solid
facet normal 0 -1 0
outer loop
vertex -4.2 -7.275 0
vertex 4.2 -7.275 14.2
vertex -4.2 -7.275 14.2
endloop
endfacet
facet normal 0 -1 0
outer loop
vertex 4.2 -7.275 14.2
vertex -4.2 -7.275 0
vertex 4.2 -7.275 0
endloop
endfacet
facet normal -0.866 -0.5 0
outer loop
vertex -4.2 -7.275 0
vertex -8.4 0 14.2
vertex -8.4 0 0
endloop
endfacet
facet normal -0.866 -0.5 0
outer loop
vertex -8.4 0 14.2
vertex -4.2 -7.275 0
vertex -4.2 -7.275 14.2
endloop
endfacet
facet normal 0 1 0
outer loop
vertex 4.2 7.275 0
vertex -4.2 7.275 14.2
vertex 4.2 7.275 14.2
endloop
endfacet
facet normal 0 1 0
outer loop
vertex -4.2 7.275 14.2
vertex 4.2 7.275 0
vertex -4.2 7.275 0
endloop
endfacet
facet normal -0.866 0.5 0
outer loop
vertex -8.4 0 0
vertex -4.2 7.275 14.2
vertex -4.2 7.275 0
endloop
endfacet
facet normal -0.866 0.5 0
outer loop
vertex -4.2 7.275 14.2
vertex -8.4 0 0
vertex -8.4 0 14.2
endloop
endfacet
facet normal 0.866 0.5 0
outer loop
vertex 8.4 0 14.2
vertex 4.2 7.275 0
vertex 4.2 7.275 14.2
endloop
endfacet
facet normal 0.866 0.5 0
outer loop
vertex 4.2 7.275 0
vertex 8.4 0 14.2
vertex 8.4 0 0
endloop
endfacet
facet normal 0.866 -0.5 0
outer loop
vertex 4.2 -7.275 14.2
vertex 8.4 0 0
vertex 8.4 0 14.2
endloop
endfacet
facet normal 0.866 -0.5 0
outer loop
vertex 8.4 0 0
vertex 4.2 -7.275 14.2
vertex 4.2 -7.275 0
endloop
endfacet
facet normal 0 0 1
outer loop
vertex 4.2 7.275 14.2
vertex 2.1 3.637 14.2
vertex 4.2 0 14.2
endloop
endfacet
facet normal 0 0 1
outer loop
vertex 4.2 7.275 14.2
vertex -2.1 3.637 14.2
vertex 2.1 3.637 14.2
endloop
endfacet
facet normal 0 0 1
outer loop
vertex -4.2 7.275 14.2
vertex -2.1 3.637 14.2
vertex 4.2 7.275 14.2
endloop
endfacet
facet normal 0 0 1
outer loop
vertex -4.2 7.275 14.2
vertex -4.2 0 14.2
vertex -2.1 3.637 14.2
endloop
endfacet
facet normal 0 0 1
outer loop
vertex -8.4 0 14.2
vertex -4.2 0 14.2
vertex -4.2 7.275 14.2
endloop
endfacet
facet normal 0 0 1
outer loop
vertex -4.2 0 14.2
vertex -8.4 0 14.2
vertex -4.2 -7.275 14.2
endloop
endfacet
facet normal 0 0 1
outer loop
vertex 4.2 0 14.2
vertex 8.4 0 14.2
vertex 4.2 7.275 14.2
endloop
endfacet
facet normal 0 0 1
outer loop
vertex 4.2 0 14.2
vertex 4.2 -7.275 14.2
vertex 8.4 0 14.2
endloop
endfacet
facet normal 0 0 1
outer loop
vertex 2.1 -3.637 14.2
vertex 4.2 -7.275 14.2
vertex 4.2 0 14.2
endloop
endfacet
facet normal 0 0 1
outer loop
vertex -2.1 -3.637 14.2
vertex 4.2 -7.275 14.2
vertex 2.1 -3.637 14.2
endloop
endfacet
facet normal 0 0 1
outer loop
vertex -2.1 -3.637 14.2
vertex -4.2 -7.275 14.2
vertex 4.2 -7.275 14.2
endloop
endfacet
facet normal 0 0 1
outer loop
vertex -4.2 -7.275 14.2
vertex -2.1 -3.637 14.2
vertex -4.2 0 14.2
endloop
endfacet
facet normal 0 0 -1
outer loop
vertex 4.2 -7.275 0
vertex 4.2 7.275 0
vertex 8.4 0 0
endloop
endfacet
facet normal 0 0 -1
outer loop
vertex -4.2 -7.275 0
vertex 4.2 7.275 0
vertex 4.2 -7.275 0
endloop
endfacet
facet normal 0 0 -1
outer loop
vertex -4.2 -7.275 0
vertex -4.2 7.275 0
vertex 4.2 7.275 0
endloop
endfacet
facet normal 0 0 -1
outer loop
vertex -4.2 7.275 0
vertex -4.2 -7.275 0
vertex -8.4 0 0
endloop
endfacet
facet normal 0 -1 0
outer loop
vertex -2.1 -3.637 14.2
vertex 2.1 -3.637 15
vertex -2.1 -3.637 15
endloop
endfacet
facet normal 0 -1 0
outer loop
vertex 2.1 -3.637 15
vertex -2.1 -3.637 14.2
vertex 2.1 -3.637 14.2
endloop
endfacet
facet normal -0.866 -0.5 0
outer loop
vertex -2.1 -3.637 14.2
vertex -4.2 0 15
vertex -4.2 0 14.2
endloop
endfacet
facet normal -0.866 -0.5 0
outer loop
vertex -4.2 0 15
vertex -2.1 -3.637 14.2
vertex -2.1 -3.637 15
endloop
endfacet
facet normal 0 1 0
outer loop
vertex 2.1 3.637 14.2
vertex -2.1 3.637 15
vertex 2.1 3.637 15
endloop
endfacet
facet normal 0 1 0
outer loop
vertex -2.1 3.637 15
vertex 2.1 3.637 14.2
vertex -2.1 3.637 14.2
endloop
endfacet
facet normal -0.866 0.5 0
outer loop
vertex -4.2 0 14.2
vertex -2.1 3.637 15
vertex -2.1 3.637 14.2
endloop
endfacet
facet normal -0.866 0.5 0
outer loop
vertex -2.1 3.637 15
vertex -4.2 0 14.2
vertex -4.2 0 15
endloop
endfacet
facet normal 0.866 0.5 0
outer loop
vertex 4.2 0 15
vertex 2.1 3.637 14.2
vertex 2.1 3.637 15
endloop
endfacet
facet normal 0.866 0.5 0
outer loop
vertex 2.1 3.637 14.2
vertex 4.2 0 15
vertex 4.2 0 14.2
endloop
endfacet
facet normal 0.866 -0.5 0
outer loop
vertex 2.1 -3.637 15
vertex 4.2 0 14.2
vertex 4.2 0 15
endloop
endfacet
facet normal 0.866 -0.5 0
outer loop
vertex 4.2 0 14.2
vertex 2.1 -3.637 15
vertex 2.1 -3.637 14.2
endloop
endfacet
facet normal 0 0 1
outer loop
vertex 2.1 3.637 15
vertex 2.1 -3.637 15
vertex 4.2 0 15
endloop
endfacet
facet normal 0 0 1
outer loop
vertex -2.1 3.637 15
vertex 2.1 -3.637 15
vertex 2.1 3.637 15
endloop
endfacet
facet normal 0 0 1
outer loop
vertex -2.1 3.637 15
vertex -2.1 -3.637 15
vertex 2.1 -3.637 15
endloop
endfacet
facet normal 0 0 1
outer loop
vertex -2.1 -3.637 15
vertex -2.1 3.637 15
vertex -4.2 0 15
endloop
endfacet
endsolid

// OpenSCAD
// file: ../cookie_cutter.scad
// Cookie cutter generator
// Pau Fernández <pauek@minidosis.org>
// GNU GPL v2

module dxf(file, layer, height) {
   orig = dxf_cross(file = file, layer = layer);
   echo("origin: ", orig);
   translate([-orig[0], -orig[1], 0])
      linear_extrude(height = height)
         import(file = file, layer = layer);
}

module needle(height, thin1, thin2) {
   union() {
      cylinder(r = thin1, h = height-0.8, $fn = 6);
      cylinder(r = thin2, h = height, $fn = 6);
   }
}

module wall(file, layer, height, thin) {
   difference() {
      minkowski() {
        dxf(file, layer, 0.01);
        cylinder(r = thin, h = height, $fn = 6);
      }
      translate([0, 0, -1]) dxf(file, layer, height + 2);
   }
}

module cutter(file, layer, height, nozzle_diameter) {
   thin1 = nozzle_diameter * 2.4;
   thin2 = nozzle_diameter * 1.2;
   difference() {
      minkowski() {
        dxf(file, layer, 0.01);
        needle(height, thin1, thin2);
      }
      translate([0, 0, -1]) dxf(file, layer, height + 2);
   }
}

module cookie_cutter(file, height, join_height, nozzle_diameter) {
   union () {
      cutter(file, "cutter", height, nozzle_diameter);
      wall(file, "outer", 1, 5);
   }
}

module cookie_cutter_join(file, height, nozzle_diameter) {
   mirror([1, 0, 0]) union () {
      cutter(file, "cutter", height, nozzle_diameter);
      wall(file, "outer", 1.5, 5);
      dxf(file, "join", 1.5);
   }
}
// main file
include <../cookie_cutter.scad>;
cookie_cutter_join("D.dxf", 15, 3.5, 0.4);
